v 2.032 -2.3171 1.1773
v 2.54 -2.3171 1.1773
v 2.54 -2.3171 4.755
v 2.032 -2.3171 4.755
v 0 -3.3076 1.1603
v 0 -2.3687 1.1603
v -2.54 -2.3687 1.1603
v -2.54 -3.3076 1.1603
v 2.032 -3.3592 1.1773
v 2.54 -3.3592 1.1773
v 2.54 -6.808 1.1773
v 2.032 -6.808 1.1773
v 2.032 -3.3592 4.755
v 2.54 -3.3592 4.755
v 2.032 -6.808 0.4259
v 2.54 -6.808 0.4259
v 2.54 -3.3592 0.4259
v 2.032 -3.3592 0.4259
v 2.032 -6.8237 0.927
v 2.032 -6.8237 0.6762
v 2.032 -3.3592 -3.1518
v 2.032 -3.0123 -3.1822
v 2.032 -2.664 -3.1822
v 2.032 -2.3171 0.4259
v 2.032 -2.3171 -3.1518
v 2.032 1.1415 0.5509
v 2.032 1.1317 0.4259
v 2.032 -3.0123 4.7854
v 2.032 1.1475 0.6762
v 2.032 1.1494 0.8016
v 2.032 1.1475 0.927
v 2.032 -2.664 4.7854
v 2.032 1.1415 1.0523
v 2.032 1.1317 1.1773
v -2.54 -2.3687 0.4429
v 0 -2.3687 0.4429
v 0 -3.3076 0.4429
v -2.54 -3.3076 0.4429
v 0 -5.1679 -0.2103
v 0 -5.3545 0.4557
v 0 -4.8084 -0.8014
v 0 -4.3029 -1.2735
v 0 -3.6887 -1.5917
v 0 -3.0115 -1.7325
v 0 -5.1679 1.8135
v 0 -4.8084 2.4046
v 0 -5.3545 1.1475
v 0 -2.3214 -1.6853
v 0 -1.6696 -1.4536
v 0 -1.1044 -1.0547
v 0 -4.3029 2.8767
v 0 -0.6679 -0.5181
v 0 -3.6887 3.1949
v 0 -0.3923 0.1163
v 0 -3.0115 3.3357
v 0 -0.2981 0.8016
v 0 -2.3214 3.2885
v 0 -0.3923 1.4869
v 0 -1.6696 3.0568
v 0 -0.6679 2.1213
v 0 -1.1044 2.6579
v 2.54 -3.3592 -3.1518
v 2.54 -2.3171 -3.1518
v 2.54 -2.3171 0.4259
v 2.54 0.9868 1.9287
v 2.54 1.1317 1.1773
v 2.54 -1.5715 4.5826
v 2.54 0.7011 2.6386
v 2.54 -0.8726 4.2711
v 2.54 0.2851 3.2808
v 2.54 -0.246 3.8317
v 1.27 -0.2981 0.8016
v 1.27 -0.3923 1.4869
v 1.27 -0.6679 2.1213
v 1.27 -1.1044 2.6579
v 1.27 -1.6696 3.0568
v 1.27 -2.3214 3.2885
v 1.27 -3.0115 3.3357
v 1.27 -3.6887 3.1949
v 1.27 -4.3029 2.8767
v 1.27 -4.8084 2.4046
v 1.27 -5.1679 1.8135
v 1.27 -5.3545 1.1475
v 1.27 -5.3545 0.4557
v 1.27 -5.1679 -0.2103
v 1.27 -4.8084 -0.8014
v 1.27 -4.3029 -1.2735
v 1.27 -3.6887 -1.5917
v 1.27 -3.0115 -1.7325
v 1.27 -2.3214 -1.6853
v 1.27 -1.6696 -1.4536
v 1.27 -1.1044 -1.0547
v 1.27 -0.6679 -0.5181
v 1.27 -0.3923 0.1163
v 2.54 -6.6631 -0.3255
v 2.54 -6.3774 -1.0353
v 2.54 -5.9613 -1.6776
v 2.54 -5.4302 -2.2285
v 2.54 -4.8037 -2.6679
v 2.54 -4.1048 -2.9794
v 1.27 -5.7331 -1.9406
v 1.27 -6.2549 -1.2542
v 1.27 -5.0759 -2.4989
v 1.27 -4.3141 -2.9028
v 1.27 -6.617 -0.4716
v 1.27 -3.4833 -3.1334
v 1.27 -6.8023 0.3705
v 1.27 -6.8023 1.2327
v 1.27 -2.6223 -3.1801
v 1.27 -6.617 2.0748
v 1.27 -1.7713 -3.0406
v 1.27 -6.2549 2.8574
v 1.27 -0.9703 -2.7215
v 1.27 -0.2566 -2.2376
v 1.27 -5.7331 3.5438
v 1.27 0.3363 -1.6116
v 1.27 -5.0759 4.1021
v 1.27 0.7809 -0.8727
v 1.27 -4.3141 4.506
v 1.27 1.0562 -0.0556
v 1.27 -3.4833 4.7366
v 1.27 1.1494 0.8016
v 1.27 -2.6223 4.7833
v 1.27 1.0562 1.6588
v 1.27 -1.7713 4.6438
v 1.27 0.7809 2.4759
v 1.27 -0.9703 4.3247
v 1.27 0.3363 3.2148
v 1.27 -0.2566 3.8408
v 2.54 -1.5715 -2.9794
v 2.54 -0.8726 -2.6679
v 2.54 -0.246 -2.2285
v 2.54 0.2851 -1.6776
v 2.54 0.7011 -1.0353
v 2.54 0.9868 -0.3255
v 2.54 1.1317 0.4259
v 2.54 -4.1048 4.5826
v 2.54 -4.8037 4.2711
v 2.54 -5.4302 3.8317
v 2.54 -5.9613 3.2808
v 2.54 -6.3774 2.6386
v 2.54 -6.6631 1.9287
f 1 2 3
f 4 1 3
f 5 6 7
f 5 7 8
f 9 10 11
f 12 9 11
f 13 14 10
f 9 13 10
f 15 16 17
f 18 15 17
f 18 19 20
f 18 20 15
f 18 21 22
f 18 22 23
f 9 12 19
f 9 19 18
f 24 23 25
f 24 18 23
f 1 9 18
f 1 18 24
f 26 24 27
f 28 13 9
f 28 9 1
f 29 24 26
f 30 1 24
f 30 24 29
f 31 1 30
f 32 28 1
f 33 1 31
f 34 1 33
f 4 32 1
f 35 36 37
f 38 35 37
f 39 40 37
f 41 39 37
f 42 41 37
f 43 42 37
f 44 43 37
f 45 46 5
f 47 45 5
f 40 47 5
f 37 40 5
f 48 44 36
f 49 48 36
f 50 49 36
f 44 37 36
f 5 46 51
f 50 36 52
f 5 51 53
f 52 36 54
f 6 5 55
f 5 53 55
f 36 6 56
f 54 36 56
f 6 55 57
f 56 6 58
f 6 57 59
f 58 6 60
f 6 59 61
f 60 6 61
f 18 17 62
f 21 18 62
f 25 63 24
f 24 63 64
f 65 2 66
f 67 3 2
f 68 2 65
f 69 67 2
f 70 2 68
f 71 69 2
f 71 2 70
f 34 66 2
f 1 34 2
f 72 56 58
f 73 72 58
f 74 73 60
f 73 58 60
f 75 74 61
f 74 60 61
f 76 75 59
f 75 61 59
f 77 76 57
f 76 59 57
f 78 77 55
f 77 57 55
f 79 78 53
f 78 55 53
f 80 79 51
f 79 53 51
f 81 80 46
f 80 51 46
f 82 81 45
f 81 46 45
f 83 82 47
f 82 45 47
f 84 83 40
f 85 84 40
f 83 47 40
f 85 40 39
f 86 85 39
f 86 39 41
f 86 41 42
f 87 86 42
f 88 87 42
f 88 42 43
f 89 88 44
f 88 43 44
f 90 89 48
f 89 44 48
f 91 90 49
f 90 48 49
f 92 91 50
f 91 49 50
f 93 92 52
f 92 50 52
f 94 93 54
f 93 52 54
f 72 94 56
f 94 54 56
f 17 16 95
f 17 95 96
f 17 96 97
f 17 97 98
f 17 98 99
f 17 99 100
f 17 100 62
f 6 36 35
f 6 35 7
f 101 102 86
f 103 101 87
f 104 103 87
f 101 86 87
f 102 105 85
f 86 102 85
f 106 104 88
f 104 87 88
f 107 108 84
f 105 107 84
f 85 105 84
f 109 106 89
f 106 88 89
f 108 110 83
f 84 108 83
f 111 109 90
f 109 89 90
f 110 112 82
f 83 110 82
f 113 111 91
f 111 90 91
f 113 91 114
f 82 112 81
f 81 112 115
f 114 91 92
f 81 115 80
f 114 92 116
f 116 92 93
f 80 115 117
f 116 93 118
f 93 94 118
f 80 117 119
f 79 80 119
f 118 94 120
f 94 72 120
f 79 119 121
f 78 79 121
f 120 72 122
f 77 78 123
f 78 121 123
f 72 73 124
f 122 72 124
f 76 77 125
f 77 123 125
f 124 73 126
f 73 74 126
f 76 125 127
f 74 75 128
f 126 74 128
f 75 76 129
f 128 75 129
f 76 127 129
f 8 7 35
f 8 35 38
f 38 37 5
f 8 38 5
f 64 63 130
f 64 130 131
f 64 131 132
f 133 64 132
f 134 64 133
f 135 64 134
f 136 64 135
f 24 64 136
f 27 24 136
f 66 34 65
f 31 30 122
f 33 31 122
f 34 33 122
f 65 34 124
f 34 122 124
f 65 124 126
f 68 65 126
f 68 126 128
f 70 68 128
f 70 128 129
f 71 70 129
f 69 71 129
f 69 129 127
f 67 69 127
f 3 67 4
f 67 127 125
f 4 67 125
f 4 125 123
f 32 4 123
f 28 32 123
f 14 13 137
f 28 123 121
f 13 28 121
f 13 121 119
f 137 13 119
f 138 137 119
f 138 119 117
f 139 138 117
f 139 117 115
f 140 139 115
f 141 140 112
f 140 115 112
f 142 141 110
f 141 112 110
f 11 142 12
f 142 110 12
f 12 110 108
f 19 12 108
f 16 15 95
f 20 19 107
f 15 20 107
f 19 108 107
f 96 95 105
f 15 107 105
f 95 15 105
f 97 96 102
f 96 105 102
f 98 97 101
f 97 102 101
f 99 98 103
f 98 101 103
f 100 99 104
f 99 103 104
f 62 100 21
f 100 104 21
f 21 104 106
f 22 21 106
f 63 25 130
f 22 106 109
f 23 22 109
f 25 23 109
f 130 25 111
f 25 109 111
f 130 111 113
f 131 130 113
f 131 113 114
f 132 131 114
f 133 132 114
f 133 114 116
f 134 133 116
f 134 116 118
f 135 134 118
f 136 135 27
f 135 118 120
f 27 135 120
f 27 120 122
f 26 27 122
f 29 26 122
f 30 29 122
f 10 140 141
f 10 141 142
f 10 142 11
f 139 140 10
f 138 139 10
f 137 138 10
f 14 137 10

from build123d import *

# Parameters (mm, degrees)
F0_R     = 2.54
F1_DEPTH = 1.27
F2_R     = 3.9875638358
F3_DEPTH = 1.27
F4_W     = 0.9389580227
F4_H     = 0.7173512131
F5_DEPTH = 2.54
F6_W     = 1.0421685874
F6_H     = 0.7513510063
F7_DEPTH = 0.508


with BuildPart() as f1:
    # F0 (on Right) → F1 (new body)
    with BuildSketch(Plane.YZ):
        with Locations((-2.8381347656, 0.8016005158)):
            Circle(F0_R)
    extrude(amount=F1_DEPTH)

    # F2 (on face) → F3 (join)
    with BuildSketch(Plane.YZ.offset(1.27)):
        with Locations((-2.8381347656, 0.8016005158)):
            Circle(F2_R)
    extrude(amount=F3_DEPTH)

    # F4 (on face) → F5 (join)
    with BuildSketch(Plane(origin=(0, 0, 0), x_dir=(0, -1, 0), z_dir=(-1, 0, 0))):
        with Locations((2.8381347656, 0.8016005158)):
            Rectangle(F4_W, F4_H)
    extrude(amount=F5_DEPTH)

    # F6 (on face) → F7 (cut)
    with BuildSketch(Plane.YZ.offset(2.54)):
        with BuildLine():
            Line((-3.3592190593, 1.177276019), (-2.3170504719, 1.177276019))
            Line((-2.3170504719, 1.177276019), (-2.3170504719, 4.7549707873))
            ThreePointArc((-2.3170504719, 4.7549707873), (-2.8381347656, 4.7891643516), (-3.3592190593, 4.7549707873))
            Line((-3.3592190593, 4.7549707873), (-3.3592190593, 1.177276019))
        make_face()
        with BuildLine():
            Line((-2.3170504719, 1.177276019), (-2.3170504719, 0.4259250127))
            Line((-2.3170504719, 0.4259250127), (1.1316930972, 0.4259250127))
            ThreePointArc((1.1316930972, 0.4259250127), (1.1449926089, 0.613553548), (1.1494290701, 0.8016005158))
            ThreePointArc((1.1494290701, 0.8016005158), (1.1449926089, 0.9896474837), (1.1316930972, 1.177276019))
            Line((1.1316930972, 1.177276019), (-2.3170504719, 1.177276019))
        make_face()
        with BuildLine():
            ThreePointArc((-3.3592190593, -3.1517697556), (-2.8381347656, -3.1859633199), (-2.3170504719, -3.1517697556))
            Line((-2.3170504719, -3.1517697556), (-2.3170504719, 0.4259250127))
            Line((-2.3170504719, 0.4259250127), (-3.3592190593, 0.4259250127))
            Line((-3.3592190593, 0.4259250127), (-3.3592190593, -3.1517697556))
        make_face()
        with BuildLine():
            Line((-6.8079626285, 0.4259250127), (-3.3592190593, 0.4259250127))
            Line((-3.3592190593, 0.4259250127), (-3.3592190593, 1.177276019))
            Line((-3.3592190593, 1.177276019), (-6.8079626285, 1.177276019))
            ThreePointArc((-6.8079626285, 1.177276019), (-6.8256986014, 0.8016005158), (-6.8079626285, 0.4259250127))
        make_face()
        with Locations((-2.8381347656, 0.8016005158)):
            Rectangle(F6_W, F6_H)
    extrude(amount=-F7_DEPTH, mode=Mode.SUBTRACT)


solid = f1.part
